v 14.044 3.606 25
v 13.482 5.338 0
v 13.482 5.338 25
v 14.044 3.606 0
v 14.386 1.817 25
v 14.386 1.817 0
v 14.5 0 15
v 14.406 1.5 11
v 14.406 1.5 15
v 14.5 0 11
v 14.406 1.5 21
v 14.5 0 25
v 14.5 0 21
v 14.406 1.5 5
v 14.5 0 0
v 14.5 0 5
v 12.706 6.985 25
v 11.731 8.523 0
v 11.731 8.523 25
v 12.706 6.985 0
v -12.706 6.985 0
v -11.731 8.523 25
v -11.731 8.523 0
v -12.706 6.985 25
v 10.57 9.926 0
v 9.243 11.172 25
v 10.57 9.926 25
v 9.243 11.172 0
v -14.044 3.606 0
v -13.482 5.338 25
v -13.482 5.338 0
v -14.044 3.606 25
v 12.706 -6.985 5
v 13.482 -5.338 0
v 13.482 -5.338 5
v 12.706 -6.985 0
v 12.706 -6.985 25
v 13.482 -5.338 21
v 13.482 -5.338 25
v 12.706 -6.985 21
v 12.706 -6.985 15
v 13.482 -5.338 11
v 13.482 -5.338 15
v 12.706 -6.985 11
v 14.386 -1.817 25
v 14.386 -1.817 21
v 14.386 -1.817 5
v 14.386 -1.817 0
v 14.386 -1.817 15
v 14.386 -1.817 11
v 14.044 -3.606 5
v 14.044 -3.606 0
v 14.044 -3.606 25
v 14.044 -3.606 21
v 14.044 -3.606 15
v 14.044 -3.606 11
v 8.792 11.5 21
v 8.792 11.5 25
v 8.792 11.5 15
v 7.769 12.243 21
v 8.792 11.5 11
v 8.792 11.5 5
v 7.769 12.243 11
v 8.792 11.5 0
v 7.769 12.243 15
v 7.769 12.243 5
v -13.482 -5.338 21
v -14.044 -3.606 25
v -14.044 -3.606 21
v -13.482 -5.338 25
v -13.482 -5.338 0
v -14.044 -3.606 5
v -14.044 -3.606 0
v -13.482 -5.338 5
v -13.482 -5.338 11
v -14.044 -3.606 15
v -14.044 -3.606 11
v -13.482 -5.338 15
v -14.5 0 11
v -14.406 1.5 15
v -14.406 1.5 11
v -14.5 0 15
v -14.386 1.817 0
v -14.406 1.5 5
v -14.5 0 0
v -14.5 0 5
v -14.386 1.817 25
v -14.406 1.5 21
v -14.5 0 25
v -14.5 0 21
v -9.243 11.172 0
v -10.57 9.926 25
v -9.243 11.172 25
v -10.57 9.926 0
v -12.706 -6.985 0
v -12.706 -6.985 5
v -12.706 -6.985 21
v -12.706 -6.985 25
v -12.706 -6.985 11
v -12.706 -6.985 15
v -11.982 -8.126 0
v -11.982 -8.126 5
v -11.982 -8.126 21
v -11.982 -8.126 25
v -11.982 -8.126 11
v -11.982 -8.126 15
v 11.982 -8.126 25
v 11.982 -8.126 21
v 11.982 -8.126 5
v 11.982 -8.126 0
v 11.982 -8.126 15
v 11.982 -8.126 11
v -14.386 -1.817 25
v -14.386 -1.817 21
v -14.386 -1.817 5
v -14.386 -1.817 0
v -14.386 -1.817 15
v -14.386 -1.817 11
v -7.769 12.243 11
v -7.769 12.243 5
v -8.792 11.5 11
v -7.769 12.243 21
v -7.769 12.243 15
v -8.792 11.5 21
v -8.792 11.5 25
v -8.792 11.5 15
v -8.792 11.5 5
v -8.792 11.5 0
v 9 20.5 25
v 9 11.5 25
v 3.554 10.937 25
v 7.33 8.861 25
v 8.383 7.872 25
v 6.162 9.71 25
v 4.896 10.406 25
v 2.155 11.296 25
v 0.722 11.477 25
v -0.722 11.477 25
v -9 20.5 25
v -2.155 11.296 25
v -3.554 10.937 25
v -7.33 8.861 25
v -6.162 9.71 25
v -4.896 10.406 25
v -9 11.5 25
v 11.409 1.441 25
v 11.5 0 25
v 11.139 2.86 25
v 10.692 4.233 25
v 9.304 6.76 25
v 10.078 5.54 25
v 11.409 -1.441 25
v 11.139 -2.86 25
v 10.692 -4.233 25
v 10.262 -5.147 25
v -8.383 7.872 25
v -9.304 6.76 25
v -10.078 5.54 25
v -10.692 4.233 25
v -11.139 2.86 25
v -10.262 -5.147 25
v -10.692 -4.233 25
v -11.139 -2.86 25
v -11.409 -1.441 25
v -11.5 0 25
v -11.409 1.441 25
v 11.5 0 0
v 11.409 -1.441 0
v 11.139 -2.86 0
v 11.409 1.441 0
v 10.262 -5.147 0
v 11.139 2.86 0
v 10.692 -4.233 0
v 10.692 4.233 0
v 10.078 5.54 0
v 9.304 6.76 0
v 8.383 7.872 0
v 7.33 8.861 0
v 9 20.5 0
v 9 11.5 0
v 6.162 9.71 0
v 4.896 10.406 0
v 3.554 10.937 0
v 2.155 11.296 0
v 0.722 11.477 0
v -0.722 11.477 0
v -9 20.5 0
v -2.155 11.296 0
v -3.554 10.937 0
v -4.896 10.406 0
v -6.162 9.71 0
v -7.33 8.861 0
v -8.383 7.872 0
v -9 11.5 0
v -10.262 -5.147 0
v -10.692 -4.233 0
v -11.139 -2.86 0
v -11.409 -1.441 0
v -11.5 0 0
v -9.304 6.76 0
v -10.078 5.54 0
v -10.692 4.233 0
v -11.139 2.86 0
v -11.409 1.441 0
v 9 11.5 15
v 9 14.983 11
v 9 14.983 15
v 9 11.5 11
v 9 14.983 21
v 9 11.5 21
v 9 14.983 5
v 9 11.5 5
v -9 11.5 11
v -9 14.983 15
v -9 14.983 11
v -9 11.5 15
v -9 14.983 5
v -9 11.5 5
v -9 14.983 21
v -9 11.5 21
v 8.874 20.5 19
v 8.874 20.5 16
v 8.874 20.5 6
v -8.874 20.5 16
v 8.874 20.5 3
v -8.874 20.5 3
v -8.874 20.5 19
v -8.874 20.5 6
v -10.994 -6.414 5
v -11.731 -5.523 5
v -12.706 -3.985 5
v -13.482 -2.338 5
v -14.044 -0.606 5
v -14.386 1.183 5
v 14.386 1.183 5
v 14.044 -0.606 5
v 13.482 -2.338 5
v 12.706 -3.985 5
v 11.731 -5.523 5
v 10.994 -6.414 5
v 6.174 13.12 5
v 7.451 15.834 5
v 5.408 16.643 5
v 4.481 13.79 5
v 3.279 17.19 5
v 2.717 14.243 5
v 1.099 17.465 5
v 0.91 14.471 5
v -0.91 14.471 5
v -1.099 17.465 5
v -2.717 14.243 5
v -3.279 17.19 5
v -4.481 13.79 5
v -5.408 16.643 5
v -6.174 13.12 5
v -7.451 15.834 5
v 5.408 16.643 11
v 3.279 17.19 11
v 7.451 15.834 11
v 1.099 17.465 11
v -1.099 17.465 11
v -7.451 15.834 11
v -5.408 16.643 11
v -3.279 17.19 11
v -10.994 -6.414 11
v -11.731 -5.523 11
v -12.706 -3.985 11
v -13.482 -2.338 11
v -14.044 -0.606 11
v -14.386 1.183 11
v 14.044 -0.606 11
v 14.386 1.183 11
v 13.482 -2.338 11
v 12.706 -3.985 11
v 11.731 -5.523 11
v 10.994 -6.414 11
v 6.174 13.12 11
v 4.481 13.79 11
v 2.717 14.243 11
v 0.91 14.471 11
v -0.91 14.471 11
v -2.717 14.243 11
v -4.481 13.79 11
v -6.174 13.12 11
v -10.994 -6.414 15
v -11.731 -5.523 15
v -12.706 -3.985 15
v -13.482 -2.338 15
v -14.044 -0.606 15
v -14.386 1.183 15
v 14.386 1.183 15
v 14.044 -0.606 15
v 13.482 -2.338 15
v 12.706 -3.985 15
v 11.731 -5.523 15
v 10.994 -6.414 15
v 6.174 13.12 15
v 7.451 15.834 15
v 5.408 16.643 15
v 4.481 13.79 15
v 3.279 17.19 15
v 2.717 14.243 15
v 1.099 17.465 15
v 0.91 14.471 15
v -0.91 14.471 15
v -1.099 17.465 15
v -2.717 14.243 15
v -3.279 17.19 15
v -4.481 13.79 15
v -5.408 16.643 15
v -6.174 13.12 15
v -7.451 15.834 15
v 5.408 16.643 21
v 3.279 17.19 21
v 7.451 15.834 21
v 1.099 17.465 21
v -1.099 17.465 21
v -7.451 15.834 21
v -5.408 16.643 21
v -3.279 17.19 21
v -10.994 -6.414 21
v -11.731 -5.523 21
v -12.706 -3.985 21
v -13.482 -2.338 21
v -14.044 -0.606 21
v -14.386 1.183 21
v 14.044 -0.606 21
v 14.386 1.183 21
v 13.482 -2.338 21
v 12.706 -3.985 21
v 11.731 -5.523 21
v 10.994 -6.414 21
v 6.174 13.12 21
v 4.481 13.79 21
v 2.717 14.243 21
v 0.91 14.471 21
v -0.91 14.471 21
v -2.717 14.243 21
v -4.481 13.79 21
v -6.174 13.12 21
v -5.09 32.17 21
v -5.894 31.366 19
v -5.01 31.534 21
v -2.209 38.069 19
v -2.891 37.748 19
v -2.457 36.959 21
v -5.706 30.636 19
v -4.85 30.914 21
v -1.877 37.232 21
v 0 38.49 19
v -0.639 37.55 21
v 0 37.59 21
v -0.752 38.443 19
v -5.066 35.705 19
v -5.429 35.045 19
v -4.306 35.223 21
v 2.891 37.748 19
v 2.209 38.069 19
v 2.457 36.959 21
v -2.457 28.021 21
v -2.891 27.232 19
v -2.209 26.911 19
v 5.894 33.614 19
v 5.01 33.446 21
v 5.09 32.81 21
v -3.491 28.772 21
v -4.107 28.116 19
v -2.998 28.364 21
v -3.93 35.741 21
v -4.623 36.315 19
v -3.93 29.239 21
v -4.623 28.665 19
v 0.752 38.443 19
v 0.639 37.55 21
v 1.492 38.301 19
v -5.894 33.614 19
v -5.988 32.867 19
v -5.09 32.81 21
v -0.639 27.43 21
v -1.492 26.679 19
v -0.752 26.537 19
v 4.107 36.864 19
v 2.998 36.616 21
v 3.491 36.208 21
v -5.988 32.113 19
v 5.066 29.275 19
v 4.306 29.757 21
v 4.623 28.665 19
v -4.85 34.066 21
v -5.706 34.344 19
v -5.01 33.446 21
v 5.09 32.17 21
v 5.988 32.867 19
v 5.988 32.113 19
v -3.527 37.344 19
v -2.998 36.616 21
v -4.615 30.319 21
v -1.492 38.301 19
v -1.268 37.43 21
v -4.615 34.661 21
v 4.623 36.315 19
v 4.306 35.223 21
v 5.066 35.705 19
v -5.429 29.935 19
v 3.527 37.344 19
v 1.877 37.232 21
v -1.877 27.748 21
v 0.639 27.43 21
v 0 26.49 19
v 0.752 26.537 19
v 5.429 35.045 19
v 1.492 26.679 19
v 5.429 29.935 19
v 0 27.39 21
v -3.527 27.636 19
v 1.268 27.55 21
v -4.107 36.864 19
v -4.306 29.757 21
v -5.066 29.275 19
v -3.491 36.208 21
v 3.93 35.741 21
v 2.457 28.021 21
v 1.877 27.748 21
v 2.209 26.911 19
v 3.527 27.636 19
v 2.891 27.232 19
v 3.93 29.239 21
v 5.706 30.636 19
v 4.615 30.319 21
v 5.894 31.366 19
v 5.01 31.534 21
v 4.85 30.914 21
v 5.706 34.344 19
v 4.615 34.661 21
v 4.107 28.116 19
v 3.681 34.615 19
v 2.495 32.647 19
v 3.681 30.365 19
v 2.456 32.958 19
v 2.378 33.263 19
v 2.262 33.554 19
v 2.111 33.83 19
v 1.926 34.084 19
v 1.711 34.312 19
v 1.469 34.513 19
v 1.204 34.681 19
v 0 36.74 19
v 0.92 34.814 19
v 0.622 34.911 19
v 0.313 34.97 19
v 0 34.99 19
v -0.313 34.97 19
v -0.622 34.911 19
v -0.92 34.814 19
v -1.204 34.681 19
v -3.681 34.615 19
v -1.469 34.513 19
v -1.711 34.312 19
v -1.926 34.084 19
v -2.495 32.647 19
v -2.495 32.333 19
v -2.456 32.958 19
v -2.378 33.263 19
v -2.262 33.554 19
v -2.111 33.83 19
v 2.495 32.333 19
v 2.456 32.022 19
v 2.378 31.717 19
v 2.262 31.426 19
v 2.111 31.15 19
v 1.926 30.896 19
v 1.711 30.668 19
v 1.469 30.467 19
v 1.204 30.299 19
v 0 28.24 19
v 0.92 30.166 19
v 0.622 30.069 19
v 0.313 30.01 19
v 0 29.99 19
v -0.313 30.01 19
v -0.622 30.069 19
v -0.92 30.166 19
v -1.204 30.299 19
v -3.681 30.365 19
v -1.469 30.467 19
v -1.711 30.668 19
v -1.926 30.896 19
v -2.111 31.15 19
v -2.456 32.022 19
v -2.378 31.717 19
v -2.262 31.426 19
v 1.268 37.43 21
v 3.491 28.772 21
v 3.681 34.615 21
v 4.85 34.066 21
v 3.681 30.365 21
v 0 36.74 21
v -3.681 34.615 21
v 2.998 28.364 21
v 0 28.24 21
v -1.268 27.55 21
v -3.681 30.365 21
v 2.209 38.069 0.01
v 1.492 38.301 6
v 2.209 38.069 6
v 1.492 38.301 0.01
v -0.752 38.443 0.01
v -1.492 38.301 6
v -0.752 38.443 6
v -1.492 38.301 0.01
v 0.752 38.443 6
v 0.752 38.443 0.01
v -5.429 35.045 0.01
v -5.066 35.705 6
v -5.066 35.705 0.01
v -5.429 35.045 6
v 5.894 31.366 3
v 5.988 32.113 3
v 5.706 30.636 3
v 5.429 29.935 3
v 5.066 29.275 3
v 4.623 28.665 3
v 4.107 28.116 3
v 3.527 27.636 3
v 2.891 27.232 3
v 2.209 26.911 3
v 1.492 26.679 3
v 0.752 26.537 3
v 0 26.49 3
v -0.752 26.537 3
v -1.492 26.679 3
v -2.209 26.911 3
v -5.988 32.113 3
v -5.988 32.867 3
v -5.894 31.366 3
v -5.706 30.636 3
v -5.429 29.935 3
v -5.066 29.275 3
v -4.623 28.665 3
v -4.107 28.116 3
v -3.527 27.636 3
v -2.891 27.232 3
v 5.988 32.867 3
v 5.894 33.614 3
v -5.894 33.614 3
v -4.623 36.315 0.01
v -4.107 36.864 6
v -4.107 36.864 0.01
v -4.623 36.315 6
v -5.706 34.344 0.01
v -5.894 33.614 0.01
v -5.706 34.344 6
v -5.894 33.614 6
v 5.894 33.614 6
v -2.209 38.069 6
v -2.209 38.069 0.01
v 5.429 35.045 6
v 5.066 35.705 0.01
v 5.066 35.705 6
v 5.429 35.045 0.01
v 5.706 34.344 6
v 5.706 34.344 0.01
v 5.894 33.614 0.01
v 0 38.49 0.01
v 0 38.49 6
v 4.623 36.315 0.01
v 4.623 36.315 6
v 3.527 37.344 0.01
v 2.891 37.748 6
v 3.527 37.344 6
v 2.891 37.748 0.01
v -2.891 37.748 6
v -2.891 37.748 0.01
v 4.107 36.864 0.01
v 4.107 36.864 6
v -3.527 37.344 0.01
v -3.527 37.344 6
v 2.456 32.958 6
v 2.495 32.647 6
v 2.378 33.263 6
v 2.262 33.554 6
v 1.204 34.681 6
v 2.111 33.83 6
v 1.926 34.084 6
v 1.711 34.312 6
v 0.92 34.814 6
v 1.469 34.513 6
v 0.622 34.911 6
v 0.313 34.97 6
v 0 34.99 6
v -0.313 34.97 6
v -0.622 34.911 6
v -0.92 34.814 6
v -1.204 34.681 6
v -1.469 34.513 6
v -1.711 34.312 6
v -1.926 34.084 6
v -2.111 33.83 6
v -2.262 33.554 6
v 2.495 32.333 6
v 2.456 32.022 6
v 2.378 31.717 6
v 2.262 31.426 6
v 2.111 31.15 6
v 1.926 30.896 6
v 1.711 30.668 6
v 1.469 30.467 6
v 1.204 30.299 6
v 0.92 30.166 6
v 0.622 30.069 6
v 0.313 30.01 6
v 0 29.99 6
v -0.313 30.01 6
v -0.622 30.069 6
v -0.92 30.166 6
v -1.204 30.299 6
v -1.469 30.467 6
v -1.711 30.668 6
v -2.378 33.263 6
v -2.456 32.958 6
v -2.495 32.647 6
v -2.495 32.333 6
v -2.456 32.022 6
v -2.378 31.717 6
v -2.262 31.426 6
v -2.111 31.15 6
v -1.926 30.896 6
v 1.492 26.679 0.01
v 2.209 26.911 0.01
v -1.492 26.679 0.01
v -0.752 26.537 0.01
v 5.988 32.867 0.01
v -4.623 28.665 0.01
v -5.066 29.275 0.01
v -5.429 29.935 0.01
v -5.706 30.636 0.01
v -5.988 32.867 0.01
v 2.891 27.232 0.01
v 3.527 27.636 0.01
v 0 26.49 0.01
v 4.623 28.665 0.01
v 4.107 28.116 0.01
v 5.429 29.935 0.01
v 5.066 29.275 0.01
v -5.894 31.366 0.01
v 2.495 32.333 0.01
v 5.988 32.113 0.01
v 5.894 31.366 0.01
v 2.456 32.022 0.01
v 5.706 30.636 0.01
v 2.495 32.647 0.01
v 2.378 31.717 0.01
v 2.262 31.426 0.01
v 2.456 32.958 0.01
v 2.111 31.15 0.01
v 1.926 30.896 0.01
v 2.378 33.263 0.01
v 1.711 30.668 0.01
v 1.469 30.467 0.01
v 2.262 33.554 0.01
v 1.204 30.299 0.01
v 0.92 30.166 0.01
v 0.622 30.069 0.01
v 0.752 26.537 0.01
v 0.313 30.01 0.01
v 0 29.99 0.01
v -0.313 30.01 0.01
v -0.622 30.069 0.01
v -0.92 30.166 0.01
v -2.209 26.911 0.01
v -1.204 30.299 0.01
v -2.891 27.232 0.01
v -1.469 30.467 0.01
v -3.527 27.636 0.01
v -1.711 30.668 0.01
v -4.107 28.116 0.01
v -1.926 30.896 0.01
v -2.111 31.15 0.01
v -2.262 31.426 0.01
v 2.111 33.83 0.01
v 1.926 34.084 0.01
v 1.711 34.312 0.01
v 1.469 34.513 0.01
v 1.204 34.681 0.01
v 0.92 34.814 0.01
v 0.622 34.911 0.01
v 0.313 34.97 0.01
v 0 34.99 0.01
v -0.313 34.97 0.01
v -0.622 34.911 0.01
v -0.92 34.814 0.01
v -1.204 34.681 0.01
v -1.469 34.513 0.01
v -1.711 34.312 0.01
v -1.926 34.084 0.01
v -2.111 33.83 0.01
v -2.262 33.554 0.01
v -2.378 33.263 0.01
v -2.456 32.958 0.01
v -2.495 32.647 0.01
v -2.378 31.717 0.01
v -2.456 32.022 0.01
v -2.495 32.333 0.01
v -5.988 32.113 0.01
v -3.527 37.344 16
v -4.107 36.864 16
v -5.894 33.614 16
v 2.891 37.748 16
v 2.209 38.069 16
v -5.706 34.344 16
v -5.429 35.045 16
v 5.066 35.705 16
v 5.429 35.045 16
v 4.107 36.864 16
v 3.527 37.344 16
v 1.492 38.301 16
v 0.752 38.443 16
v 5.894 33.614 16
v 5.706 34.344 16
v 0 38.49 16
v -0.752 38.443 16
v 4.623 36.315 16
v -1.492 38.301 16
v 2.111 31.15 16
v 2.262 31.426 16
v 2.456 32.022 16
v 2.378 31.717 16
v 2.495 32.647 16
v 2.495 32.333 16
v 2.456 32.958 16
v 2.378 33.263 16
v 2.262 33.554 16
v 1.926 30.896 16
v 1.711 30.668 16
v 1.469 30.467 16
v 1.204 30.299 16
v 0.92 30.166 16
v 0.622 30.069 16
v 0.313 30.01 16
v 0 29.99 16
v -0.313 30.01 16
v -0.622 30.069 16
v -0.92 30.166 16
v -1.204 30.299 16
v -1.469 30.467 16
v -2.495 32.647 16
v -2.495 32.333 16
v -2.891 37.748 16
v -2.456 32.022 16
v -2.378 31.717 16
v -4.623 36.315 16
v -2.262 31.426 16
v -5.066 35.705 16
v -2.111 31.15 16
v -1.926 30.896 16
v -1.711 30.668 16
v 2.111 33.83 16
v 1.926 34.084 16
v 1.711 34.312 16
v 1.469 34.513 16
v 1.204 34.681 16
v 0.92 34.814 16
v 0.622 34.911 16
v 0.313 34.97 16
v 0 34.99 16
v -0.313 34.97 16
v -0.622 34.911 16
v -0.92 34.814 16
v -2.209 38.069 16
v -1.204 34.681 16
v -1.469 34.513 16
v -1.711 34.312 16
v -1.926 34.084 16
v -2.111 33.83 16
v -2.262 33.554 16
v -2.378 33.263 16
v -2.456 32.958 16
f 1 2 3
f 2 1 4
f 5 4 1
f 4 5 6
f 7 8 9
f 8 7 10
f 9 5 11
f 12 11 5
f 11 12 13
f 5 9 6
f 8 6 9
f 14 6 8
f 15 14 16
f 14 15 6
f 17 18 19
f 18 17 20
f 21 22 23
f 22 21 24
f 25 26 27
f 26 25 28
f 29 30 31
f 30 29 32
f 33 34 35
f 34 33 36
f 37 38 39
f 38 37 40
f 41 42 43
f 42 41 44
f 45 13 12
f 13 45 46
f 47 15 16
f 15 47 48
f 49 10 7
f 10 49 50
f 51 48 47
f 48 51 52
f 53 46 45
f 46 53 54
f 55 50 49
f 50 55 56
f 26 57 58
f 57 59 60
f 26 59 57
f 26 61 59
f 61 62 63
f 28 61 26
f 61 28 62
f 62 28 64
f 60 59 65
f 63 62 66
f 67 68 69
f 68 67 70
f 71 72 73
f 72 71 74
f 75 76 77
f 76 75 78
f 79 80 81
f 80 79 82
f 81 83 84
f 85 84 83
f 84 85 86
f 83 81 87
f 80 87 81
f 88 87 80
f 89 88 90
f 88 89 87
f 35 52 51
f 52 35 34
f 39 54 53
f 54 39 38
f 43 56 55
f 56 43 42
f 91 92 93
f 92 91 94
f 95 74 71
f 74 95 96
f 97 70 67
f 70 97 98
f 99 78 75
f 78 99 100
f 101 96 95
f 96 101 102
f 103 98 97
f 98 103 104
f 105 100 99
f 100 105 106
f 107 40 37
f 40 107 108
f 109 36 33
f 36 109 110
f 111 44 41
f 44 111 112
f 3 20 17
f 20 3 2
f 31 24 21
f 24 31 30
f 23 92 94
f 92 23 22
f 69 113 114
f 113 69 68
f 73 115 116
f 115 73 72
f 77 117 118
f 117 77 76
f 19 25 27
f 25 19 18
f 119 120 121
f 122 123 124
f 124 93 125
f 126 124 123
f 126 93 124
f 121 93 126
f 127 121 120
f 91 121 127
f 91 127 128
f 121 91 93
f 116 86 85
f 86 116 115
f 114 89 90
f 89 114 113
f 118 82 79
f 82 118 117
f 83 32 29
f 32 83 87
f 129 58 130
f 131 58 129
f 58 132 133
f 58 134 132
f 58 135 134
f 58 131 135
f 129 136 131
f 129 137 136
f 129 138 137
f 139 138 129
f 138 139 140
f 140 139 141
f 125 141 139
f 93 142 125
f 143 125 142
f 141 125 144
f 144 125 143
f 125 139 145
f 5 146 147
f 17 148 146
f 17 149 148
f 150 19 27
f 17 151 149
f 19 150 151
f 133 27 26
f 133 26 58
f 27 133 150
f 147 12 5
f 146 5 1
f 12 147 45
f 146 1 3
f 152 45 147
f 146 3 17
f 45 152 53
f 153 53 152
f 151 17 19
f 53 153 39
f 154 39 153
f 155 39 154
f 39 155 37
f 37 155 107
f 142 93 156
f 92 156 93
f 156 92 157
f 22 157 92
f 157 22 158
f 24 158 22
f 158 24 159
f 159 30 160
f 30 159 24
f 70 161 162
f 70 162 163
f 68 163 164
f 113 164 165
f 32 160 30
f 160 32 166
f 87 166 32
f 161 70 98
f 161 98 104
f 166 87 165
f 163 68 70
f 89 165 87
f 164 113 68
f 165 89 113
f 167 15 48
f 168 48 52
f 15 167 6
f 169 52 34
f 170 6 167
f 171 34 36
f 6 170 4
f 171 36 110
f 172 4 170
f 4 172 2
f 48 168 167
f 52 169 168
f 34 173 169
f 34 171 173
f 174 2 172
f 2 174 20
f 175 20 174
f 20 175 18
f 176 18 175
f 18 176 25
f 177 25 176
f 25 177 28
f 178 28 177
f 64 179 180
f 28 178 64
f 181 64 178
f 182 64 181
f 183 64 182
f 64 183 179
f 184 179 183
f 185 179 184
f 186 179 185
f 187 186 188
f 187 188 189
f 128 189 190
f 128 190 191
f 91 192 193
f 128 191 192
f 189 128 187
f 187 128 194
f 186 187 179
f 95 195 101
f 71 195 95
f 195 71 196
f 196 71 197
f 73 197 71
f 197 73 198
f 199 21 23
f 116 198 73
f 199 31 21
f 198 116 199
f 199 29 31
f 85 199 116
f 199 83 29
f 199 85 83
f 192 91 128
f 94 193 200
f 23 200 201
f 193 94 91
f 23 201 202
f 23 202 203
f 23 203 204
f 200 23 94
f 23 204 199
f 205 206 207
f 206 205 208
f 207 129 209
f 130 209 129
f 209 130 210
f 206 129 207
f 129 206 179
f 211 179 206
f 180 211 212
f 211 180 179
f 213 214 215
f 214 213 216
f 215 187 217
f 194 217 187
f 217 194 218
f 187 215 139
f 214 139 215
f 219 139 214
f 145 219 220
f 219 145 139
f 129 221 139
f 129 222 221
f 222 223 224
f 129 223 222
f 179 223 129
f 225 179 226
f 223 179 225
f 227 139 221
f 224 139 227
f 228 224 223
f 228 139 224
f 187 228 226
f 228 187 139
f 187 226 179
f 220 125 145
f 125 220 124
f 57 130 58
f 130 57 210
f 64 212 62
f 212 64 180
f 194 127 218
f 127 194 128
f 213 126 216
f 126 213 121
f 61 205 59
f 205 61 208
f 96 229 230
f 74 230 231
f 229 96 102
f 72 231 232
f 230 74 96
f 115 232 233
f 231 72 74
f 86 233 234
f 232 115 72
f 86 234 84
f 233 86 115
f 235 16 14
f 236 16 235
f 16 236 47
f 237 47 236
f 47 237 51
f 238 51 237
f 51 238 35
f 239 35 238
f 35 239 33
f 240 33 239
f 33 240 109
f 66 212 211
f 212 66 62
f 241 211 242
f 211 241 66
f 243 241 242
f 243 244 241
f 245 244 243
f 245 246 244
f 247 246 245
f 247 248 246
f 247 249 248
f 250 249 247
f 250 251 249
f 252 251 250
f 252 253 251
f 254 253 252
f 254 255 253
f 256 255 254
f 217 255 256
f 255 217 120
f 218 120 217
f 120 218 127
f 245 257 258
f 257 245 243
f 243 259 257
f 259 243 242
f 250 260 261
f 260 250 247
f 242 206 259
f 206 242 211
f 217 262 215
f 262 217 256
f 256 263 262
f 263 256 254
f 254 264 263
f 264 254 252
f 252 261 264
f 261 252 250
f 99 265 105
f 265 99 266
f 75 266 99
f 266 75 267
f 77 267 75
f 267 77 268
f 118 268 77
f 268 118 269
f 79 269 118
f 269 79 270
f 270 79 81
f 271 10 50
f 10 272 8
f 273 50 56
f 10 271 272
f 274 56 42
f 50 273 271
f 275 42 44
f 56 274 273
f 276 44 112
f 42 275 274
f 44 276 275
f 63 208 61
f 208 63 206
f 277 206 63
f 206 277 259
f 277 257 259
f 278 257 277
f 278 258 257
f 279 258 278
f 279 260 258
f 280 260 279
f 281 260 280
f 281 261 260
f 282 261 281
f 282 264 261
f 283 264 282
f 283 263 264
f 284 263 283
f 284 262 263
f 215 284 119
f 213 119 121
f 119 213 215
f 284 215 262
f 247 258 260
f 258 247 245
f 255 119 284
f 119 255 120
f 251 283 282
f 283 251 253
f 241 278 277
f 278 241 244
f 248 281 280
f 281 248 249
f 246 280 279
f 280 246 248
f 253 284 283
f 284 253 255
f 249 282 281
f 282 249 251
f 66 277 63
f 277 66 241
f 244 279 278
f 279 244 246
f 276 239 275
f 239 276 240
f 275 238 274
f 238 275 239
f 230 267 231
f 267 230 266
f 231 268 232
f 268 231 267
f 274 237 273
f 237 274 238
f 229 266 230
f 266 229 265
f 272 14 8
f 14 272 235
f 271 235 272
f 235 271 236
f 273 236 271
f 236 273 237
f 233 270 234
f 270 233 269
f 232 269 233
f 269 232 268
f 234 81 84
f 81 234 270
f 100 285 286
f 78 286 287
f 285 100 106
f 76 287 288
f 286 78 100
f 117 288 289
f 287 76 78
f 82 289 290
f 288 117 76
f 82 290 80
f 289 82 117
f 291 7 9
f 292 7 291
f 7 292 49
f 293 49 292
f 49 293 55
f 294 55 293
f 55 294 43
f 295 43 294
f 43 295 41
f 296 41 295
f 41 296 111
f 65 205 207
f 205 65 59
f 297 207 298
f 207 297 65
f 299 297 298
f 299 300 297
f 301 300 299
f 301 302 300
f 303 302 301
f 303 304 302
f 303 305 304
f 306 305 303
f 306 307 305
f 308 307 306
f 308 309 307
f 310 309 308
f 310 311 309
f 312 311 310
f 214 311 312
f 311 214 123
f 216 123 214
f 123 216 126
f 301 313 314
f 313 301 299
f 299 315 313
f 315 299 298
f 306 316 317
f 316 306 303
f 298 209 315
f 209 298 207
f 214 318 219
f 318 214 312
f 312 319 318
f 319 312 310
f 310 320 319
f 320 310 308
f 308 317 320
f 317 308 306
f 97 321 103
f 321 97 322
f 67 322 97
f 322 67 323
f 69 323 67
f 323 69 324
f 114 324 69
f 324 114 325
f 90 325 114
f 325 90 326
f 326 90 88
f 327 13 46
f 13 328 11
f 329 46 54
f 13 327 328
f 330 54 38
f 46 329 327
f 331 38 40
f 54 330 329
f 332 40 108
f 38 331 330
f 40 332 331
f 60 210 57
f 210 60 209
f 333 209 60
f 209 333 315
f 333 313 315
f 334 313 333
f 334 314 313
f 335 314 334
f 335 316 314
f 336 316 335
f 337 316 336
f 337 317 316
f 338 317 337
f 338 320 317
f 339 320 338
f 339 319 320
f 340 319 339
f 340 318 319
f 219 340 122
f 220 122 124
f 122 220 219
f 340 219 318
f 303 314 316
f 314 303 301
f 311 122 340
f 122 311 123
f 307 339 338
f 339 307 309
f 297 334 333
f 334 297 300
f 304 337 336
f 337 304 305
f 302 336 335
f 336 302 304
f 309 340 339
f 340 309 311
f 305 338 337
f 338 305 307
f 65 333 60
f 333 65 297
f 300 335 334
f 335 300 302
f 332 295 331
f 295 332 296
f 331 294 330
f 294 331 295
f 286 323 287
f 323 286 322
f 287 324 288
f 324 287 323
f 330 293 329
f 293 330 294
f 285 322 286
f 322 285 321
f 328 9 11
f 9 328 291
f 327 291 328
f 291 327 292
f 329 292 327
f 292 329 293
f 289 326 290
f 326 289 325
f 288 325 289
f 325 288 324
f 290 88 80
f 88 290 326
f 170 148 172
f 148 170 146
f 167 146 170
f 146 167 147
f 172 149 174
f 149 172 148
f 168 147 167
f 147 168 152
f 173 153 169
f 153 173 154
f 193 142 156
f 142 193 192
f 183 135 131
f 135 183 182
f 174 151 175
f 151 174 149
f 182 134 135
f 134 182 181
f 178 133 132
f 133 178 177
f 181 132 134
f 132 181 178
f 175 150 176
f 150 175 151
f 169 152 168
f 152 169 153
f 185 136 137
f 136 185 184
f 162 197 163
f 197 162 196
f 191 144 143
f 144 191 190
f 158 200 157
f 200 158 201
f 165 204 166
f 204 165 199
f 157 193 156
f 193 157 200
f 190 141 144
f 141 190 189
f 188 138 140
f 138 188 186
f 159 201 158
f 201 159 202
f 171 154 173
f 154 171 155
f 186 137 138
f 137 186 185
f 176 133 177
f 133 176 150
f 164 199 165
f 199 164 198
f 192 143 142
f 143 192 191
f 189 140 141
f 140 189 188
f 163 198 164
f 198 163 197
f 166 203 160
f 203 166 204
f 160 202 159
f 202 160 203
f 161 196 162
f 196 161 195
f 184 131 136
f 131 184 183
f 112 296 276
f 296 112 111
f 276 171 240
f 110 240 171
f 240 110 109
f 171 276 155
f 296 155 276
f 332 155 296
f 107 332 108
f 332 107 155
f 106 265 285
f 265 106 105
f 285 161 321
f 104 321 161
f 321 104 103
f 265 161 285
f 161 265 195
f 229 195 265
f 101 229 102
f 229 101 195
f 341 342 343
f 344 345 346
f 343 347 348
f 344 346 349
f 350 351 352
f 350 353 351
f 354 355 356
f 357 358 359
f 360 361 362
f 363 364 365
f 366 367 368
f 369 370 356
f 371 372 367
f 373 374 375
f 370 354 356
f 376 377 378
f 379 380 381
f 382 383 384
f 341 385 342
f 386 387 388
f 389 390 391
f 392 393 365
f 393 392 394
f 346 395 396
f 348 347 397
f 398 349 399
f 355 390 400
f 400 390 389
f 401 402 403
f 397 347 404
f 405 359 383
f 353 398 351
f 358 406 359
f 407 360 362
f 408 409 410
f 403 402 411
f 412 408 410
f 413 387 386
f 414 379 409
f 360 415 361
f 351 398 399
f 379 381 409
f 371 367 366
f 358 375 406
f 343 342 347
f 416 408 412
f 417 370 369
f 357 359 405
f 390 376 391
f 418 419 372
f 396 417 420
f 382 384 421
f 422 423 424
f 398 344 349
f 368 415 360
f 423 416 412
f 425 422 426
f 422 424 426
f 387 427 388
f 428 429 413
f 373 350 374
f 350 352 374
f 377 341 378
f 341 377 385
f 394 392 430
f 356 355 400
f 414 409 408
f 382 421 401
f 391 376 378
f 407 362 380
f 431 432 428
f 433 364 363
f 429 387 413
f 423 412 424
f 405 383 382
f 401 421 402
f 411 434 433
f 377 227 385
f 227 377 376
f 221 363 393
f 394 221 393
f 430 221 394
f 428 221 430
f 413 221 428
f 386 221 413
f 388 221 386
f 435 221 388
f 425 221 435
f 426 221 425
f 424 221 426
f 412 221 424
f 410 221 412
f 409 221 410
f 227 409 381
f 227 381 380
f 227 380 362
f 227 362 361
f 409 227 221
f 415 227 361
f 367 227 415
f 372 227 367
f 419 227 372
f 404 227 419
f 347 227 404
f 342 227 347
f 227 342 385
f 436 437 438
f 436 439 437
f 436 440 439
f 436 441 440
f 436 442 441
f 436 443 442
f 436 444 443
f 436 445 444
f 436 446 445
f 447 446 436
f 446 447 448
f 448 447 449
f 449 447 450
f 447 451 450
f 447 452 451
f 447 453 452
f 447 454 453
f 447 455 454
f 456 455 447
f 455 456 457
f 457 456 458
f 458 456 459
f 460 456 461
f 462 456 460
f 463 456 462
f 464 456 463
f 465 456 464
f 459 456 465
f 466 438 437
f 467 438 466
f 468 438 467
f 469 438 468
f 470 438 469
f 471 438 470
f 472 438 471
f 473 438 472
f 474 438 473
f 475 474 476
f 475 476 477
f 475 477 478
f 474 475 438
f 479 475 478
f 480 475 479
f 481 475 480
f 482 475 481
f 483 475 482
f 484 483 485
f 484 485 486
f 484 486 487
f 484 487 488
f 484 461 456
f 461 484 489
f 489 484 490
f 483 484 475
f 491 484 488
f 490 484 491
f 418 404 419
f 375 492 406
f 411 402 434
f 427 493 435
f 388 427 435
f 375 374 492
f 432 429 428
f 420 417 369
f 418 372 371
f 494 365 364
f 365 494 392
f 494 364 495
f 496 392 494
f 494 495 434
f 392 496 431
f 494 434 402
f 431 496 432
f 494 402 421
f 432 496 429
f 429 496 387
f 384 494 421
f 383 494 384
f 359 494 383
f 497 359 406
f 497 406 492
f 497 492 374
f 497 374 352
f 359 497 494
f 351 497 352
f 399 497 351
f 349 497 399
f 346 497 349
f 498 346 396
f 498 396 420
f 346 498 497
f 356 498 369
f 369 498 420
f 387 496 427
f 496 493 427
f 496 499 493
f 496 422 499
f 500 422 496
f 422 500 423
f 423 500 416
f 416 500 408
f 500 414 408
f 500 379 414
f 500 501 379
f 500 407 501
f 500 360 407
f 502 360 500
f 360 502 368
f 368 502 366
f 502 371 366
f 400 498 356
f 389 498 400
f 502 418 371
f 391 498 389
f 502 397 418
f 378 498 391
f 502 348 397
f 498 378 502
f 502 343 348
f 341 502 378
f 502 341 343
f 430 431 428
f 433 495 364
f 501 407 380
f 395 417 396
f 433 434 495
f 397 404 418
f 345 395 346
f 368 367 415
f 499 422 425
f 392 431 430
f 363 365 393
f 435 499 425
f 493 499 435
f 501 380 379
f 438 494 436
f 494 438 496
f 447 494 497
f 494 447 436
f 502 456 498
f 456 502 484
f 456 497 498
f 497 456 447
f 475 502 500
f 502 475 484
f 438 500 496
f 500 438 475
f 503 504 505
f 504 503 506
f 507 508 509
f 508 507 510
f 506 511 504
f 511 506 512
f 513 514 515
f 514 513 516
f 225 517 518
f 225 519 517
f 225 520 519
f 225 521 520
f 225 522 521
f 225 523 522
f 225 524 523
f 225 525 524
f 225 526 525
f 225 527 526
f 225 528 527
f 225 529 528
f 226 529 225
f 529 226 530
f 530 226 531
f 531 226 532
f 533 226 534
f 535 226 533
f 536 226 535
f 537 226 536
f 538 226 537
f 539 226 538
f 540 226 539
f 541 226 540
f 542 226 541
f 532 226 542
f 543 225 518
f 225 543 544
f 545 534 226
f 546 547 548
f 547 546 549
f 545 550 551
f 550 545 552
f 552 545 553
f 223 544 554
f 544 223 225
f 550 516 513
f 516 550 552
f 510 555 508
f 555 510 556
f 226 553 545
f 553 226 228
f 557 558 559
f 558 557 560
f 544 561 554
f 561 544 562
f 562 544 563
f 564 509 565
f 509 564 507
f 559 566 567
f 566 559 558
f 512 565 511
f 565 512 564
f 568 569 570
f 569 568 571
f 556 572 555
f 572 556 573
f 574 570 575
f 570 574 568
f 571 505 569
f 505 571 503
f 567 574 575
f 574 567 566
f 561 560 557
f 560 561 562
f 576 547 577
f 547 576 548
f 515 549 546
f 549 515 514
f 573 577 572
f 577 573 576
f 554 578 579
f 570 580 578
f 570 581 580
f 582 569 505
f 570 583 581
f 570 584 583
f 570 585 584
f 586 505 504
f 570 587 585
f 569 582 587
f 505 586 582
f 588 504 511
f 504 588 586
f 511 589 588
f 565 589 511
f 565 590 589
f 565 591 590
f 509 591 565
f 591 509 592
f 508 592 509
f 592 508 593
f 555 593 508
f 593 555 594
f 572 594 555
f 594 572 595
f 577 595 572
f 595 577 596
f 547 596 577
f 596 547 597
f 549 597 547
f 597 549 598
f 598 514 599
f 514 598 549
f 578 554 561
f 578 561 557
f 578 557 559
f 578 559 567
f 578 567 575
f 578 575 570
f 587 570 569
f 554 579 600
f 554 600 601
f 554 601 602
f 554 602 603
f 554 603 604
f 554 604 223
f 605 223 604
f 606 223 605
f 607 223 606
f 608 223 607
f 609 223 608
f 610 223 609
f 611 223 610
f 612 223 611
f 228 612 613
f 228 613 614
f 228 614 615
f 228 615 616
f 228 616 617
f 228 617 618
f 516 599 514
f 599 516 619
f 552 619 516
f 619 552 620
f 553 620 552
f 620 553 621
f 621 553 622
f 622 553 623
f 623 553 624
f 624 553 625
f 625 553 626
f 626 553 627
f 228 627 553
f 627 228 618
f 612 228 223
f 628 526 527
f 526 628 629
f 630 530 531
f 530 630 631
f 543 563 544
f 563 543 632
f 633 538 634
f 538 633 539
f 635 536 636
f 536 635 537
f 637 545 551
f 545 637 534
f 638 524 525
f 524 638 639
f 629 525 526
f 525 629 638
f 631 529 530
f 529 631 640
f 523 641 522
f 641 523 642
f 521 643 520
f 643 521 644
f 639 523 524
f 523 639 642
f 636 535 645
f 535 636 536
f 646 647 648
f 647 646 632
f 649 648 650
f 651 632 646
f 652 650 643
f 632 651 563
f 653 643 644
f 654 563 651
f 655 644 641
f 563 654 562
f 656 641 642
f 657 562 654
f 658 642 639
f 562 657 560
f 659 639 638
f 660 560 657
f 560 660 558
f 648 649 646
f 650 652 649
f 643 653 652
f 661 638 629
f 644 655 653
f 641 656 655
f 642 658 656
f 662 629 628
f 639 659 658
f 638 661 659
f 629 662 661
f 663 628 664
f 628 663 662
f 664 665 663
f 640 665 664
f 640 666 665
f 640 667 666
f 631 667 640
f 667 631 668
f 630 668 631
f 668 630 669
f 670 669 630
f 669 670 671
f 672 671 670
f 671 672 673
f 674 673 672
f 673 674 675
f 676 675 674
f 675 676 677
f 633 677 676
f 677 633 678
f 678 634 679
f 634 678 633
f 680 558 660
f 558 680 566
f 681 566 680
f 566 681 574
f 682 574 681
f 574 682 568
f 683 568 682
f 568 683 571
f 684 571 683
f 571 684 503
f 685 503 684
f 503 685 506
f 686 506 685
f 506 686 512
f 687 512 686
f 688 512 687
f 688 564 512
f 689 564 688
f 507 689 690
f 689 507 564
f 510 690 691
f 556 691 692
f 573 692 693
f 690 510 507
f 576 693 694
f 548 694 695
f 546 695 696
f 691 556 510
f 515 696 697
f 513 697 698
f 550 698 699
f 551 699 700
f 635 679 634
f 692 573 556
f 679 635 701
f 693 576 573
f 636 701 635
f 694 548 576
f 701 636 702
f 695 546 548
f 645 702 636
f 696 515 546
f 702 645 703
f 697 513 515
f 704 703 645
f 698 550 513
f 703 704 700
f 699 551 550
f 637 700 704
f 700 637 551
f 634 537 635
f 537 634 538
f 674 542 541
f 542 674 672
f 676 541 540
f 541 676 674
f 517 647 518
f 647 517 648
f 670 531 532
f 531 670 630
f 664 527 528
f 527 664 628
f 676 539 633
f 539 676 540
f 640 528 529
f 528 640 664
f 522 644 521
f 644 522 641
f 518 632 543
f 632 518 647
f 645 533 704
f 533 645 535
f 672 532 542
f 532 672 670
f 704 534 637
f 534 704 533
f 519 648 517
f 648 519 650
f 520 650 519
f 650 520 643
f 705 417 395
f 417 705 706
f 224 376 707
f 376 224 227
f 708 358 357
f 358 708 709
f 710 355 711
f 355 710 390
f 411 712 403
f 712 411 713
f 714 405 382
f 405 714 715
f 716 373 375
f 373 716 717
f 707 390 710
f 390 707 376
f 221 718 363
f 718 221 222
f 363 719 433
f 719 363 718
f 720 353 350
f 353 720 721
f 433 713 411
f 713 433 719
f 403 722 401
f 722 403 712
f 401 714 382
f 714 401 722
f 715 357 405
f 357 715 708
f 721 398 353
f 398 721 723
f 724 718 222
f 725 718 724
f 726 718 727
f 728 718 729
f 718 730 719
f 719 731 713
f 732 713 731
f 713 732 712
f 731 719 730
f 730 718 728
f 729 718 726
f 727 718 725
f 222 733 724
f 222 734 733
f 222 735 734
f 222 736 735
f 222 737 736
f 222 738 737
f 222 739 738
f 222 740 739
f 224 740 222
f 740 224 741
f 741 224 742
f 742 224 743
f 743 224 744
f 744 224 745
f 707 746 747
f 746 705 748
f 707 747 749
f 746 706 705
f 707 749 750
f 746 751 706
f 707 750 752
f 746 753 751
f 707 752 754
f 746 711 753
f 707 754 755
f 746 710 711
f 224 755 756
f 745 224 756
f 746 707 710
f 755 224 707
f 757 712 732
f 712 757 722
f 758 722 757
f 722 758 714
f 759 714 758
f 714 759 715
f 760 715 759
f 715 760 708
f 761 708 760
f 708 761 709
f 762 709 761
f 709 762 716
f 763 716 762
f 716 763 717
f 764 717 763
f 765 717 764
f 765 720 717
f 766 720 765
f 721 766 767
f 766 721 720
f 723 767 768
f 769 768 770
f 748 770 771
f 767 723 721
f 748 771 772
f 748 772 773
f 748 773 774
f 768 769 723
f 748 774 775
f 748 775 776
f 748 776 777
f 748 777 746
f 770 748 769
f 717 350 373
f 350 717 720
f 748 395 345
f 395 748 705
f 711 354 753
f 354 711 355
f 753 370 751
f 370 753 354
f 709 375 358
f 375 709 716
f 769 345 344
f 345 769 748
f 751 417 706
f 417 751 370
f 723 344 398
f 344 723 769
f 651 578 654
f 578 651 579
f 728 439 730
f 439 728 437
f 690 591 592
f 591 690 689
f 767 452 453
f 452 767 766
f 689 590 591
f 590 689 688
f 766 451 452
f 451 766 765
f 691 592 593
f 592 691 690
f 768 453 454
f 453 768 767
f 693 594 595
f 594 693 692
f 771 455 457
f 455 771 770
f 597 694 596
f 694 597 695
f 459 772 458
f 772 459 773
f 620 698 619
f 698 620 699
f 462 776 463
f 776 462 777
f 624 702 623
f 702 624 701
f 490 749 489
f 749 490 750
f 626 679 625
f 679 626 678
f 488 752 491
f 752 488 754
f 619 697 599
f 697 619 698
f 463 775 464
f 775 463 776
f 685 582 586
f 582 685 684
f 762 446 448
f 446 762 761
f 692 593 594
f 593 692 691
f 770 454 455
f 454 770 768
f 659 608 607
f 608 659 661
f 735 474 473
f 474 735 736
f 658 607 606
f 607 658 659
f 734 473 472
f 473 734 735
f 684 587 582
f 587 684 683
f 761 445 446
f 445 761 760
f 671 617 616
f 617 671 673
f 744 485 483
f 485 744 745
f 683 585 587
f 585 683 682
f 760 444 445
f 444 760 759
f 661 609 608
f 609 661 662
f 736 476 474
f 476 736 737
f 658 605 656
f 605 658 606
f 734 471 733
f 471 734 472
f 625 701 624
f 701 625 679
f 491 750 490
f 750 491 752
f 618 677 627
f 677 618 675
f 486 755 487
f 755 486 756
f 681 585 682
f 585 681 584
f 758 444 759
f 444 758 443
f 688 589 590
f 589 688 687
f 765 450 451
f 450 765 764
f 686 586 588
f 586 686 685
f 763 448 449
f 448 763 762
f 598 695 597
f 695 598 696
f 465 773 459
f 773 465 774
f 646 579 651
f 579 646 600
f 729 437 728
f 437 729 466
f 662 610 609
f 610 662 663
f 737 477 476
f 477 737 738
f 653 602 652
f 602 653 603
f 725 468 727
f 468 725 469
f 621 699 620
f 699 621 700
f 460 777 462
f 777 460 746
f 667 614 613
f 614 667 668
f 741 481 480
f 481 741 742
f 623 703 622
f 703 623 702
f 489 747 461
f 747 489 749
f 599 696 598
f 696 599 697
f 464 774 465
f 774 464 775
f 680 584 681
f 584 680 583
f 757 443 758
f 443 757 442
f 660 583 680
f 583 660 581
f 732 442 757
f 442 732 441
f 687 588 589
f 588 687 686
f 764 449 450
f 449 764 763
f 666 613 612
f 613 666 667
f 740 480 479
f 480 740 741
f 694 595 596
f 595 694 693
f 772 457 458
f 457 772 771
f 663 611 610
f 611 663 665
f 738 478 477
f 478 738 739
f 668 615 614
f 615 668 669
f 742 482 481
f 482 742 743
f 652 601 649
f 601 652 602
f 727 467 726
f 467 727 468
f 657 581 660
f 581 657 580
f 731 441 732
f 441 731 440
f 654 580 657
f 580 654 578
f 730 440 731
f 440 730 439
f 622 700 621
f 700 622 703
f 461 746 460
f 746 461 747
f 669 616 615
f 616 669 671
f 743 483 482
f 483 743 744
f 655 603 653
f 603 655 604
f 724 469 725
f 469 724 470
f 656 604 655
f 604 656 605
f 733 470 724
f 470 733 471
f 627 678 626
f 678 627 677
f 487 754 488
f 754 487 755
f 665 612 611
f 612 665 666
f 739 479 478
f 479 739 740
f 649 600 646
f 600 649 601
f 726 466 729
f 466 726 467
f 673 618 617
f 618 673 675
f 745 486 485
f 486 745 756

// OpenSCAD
// dash-cam mirror bracket
// Replaces the boneheaded suction cup that falls off the glass every
// time it gets a little warm.

// TODO: Set actual measurements

mirrorPostDia=23;
mirrorClipWidth=25;
mirrorClipThickness=3;
mirrorClipBlockHeight=9;

clampHingeBaseWidth=17;
clampHingeGapWidth=10;
clampHingeAxleHeight=12;
clampHingeAxleOuterDia=12;
clampHingeThicknessScrewSide=3;
clampHingeThicnessNutSide=3;
clampHingeAxleInnerDia=5;
clampHingeNutInsetDia=8.5;

screwSideFlangeThickness=3;
nutSideFlangeThickness=2;


// calculated
clampHingeOverallWidth=clampHingeGapWidth+clampHingeThicknessScrewSide+clampHingeThicnessNutSide;

overlap=0.01;
$fn=50;

union() {
    postClip(mirrorPostDia, mirrorClipWidth, mirrorClipThickness, mirrorClipBlockHeight);
    hingePositionOffset=screwSideFlangeThickness;  // Align with print bed
    translate([0,mirrorPostDia/2+mirrorClipBlockHeight-overlap,hingePositionOffset])
        rotate([0,0,90])
            clampHinge(clampHingeBaseWidth,clampHingeGapWidth,clampHingeAxleHeight,
                clampHingeAxleOuterDia,clampHingeThicknessScrewSide,
                clampHingeThicnessNutSide,clampHingeAxleInnerDia,
                screwSideFlangeThickness,nutSideFlangeThickness,
                clampHingeNutInsetDia);
}

// TODO: add Flange and nut inset
// Note: Taper flange for vertical printing w/o support (i.e. > 45 degrees)
module clampHinge(baseWidth, gapWidth, axleHeight, axleOuterDia, thicknessScrewSide, 
        thicknessNutSide, axleInnerDia,
        screwSideFlangeThickness, nutSideFlangeThickness,
        nutInsetDia) {
    hingeOverallWidth=gapWidth+thicknessScrewSide+thicknessNutSide;
    hingeOverallWidthWithFlanges=hingeOverallWidth+screwSideFlangeThickness
        +nutSideFlangeThickness;
    difference() {
        // screw side
        union() {
            hull() {
                // axle (top) corner
                translate([axleHeight,0,0])
                    cylinder(d=axleOuterDia, h=thicknessScrewSide);
                translate([0,-baseWidth/2,0])
                    cylinder(d=1, h=thicknessScrewSide, $fn=3);
                translate([0,baseWidth/2,0])
                    cylinder(d=1, h=thicknessScrewSide, $fn=3);
            }
            // Screw-side flange
            translate([axleHeight,0,-screwSideFlangeThickness+overlap])
                cylinder(d=axleOuterDia, h=screwSideFlangeThickness);
            // nut side
            translate([0,0,thicknessScrewSide+gapWidth])
                hull() {
                    // axle (top) corner
                    translate([axleHeight,0,0])
                        cylinder(d=axleOuterDia, h=thicknessNutSide);
                    translate([0,-baseWidth/2,0])
                        cylinder(d=1, h=thicknessNutSide, $fn=3);
                    translate([0,baseWidth/2,0])
                        cylinder(d=1, h=thicknessNutSide, $fn=3);
                }
                // Nut-side flange
                translate([axleHeight,0,hingeOverallWidth])
                    difference() {
                        cylinder(d1=axleOuterDia, d2=axleOuterDia*0.85, h=nutSideFlangeThickness);
                        translate([0,0,-overlap])
                            cylinder(d=nutInsetDia, h=nutSideFlangeThickness+overlap*2, $fn=6);
                    }
                
        }
        // axle cut
        translate([axleHeight,0,-screwSideFlangeThickness-overlap])
           cylinder(d=axleInnerDia,h=hingeOverallWidthWithFlanges+overlap*2);
    }
}


module postClip(postDia, clipWidth, thickness, blockHeight) {
    tieWrapWidth=6;
    tieWrapThickness=3;
    blockWidth=blockHeight*2;
    echo("blockWidth calculated as: ", blockWidth);
    difference() {
        union() {
            cylinder(d=postDia+thickness*2, h=clipWidth);
            translate([-blockWidth/2,postDia/2,0])
                cube([blockWidth, blockHeight, clipWidth]);
        }
        // center
        translate([0,0,-overlap])
            cylinder(d=postDia, h=clipWidth+overlap*2);
        // side opening
        translate([0,-postDia*3/4,-overlap])
            cylinder(d=postDia*1.5, h=clipWidth+overlap*2, $fn=6);
        // tie-wrap cut 1
        translate([0,0,clipWidth/5]) 
            tieWrapCut(postDia, thickness, tieWrapThickness, tieWrapWidth);
        // tie-wrap cut 2
        translate([0,0,clipWidth*3/5])
            tieWrapCut(postDia, thickness, tieWrapThickness, tieWrapWidth);
    }
}

module tieWrapCut(postDia, thickness, tieWrapThickness, tieWrapWidth) {
    cutOuterDia=postDia+thickness*2+tieWrapThickness*2;
    difference() {
        cylinder(d=cutOuterDia, h=tieWrapWidth);
        translate([0,0,-overlap])
            cylinder(d=postDia+thickness*2, h=tieWrapWidth+overlap*2);
    }
    difference() {
        cylinder(d=postDia+thickness*2+tieWrapThickness*2, h=tieWrapWidth);
        translate([-cutOuterDia/2-overlap,tieWrapThickness,-overlap])
            cube([cutOuterDia+overlap*2,cutOuterDia,tieWrapWidth+overlap*2]);
        translate([0,tieWrapThickness,-overlap])
            cylinder(d=postDia+thickness*2, h=tieWrapWidth+overlap*2);
    }
}
